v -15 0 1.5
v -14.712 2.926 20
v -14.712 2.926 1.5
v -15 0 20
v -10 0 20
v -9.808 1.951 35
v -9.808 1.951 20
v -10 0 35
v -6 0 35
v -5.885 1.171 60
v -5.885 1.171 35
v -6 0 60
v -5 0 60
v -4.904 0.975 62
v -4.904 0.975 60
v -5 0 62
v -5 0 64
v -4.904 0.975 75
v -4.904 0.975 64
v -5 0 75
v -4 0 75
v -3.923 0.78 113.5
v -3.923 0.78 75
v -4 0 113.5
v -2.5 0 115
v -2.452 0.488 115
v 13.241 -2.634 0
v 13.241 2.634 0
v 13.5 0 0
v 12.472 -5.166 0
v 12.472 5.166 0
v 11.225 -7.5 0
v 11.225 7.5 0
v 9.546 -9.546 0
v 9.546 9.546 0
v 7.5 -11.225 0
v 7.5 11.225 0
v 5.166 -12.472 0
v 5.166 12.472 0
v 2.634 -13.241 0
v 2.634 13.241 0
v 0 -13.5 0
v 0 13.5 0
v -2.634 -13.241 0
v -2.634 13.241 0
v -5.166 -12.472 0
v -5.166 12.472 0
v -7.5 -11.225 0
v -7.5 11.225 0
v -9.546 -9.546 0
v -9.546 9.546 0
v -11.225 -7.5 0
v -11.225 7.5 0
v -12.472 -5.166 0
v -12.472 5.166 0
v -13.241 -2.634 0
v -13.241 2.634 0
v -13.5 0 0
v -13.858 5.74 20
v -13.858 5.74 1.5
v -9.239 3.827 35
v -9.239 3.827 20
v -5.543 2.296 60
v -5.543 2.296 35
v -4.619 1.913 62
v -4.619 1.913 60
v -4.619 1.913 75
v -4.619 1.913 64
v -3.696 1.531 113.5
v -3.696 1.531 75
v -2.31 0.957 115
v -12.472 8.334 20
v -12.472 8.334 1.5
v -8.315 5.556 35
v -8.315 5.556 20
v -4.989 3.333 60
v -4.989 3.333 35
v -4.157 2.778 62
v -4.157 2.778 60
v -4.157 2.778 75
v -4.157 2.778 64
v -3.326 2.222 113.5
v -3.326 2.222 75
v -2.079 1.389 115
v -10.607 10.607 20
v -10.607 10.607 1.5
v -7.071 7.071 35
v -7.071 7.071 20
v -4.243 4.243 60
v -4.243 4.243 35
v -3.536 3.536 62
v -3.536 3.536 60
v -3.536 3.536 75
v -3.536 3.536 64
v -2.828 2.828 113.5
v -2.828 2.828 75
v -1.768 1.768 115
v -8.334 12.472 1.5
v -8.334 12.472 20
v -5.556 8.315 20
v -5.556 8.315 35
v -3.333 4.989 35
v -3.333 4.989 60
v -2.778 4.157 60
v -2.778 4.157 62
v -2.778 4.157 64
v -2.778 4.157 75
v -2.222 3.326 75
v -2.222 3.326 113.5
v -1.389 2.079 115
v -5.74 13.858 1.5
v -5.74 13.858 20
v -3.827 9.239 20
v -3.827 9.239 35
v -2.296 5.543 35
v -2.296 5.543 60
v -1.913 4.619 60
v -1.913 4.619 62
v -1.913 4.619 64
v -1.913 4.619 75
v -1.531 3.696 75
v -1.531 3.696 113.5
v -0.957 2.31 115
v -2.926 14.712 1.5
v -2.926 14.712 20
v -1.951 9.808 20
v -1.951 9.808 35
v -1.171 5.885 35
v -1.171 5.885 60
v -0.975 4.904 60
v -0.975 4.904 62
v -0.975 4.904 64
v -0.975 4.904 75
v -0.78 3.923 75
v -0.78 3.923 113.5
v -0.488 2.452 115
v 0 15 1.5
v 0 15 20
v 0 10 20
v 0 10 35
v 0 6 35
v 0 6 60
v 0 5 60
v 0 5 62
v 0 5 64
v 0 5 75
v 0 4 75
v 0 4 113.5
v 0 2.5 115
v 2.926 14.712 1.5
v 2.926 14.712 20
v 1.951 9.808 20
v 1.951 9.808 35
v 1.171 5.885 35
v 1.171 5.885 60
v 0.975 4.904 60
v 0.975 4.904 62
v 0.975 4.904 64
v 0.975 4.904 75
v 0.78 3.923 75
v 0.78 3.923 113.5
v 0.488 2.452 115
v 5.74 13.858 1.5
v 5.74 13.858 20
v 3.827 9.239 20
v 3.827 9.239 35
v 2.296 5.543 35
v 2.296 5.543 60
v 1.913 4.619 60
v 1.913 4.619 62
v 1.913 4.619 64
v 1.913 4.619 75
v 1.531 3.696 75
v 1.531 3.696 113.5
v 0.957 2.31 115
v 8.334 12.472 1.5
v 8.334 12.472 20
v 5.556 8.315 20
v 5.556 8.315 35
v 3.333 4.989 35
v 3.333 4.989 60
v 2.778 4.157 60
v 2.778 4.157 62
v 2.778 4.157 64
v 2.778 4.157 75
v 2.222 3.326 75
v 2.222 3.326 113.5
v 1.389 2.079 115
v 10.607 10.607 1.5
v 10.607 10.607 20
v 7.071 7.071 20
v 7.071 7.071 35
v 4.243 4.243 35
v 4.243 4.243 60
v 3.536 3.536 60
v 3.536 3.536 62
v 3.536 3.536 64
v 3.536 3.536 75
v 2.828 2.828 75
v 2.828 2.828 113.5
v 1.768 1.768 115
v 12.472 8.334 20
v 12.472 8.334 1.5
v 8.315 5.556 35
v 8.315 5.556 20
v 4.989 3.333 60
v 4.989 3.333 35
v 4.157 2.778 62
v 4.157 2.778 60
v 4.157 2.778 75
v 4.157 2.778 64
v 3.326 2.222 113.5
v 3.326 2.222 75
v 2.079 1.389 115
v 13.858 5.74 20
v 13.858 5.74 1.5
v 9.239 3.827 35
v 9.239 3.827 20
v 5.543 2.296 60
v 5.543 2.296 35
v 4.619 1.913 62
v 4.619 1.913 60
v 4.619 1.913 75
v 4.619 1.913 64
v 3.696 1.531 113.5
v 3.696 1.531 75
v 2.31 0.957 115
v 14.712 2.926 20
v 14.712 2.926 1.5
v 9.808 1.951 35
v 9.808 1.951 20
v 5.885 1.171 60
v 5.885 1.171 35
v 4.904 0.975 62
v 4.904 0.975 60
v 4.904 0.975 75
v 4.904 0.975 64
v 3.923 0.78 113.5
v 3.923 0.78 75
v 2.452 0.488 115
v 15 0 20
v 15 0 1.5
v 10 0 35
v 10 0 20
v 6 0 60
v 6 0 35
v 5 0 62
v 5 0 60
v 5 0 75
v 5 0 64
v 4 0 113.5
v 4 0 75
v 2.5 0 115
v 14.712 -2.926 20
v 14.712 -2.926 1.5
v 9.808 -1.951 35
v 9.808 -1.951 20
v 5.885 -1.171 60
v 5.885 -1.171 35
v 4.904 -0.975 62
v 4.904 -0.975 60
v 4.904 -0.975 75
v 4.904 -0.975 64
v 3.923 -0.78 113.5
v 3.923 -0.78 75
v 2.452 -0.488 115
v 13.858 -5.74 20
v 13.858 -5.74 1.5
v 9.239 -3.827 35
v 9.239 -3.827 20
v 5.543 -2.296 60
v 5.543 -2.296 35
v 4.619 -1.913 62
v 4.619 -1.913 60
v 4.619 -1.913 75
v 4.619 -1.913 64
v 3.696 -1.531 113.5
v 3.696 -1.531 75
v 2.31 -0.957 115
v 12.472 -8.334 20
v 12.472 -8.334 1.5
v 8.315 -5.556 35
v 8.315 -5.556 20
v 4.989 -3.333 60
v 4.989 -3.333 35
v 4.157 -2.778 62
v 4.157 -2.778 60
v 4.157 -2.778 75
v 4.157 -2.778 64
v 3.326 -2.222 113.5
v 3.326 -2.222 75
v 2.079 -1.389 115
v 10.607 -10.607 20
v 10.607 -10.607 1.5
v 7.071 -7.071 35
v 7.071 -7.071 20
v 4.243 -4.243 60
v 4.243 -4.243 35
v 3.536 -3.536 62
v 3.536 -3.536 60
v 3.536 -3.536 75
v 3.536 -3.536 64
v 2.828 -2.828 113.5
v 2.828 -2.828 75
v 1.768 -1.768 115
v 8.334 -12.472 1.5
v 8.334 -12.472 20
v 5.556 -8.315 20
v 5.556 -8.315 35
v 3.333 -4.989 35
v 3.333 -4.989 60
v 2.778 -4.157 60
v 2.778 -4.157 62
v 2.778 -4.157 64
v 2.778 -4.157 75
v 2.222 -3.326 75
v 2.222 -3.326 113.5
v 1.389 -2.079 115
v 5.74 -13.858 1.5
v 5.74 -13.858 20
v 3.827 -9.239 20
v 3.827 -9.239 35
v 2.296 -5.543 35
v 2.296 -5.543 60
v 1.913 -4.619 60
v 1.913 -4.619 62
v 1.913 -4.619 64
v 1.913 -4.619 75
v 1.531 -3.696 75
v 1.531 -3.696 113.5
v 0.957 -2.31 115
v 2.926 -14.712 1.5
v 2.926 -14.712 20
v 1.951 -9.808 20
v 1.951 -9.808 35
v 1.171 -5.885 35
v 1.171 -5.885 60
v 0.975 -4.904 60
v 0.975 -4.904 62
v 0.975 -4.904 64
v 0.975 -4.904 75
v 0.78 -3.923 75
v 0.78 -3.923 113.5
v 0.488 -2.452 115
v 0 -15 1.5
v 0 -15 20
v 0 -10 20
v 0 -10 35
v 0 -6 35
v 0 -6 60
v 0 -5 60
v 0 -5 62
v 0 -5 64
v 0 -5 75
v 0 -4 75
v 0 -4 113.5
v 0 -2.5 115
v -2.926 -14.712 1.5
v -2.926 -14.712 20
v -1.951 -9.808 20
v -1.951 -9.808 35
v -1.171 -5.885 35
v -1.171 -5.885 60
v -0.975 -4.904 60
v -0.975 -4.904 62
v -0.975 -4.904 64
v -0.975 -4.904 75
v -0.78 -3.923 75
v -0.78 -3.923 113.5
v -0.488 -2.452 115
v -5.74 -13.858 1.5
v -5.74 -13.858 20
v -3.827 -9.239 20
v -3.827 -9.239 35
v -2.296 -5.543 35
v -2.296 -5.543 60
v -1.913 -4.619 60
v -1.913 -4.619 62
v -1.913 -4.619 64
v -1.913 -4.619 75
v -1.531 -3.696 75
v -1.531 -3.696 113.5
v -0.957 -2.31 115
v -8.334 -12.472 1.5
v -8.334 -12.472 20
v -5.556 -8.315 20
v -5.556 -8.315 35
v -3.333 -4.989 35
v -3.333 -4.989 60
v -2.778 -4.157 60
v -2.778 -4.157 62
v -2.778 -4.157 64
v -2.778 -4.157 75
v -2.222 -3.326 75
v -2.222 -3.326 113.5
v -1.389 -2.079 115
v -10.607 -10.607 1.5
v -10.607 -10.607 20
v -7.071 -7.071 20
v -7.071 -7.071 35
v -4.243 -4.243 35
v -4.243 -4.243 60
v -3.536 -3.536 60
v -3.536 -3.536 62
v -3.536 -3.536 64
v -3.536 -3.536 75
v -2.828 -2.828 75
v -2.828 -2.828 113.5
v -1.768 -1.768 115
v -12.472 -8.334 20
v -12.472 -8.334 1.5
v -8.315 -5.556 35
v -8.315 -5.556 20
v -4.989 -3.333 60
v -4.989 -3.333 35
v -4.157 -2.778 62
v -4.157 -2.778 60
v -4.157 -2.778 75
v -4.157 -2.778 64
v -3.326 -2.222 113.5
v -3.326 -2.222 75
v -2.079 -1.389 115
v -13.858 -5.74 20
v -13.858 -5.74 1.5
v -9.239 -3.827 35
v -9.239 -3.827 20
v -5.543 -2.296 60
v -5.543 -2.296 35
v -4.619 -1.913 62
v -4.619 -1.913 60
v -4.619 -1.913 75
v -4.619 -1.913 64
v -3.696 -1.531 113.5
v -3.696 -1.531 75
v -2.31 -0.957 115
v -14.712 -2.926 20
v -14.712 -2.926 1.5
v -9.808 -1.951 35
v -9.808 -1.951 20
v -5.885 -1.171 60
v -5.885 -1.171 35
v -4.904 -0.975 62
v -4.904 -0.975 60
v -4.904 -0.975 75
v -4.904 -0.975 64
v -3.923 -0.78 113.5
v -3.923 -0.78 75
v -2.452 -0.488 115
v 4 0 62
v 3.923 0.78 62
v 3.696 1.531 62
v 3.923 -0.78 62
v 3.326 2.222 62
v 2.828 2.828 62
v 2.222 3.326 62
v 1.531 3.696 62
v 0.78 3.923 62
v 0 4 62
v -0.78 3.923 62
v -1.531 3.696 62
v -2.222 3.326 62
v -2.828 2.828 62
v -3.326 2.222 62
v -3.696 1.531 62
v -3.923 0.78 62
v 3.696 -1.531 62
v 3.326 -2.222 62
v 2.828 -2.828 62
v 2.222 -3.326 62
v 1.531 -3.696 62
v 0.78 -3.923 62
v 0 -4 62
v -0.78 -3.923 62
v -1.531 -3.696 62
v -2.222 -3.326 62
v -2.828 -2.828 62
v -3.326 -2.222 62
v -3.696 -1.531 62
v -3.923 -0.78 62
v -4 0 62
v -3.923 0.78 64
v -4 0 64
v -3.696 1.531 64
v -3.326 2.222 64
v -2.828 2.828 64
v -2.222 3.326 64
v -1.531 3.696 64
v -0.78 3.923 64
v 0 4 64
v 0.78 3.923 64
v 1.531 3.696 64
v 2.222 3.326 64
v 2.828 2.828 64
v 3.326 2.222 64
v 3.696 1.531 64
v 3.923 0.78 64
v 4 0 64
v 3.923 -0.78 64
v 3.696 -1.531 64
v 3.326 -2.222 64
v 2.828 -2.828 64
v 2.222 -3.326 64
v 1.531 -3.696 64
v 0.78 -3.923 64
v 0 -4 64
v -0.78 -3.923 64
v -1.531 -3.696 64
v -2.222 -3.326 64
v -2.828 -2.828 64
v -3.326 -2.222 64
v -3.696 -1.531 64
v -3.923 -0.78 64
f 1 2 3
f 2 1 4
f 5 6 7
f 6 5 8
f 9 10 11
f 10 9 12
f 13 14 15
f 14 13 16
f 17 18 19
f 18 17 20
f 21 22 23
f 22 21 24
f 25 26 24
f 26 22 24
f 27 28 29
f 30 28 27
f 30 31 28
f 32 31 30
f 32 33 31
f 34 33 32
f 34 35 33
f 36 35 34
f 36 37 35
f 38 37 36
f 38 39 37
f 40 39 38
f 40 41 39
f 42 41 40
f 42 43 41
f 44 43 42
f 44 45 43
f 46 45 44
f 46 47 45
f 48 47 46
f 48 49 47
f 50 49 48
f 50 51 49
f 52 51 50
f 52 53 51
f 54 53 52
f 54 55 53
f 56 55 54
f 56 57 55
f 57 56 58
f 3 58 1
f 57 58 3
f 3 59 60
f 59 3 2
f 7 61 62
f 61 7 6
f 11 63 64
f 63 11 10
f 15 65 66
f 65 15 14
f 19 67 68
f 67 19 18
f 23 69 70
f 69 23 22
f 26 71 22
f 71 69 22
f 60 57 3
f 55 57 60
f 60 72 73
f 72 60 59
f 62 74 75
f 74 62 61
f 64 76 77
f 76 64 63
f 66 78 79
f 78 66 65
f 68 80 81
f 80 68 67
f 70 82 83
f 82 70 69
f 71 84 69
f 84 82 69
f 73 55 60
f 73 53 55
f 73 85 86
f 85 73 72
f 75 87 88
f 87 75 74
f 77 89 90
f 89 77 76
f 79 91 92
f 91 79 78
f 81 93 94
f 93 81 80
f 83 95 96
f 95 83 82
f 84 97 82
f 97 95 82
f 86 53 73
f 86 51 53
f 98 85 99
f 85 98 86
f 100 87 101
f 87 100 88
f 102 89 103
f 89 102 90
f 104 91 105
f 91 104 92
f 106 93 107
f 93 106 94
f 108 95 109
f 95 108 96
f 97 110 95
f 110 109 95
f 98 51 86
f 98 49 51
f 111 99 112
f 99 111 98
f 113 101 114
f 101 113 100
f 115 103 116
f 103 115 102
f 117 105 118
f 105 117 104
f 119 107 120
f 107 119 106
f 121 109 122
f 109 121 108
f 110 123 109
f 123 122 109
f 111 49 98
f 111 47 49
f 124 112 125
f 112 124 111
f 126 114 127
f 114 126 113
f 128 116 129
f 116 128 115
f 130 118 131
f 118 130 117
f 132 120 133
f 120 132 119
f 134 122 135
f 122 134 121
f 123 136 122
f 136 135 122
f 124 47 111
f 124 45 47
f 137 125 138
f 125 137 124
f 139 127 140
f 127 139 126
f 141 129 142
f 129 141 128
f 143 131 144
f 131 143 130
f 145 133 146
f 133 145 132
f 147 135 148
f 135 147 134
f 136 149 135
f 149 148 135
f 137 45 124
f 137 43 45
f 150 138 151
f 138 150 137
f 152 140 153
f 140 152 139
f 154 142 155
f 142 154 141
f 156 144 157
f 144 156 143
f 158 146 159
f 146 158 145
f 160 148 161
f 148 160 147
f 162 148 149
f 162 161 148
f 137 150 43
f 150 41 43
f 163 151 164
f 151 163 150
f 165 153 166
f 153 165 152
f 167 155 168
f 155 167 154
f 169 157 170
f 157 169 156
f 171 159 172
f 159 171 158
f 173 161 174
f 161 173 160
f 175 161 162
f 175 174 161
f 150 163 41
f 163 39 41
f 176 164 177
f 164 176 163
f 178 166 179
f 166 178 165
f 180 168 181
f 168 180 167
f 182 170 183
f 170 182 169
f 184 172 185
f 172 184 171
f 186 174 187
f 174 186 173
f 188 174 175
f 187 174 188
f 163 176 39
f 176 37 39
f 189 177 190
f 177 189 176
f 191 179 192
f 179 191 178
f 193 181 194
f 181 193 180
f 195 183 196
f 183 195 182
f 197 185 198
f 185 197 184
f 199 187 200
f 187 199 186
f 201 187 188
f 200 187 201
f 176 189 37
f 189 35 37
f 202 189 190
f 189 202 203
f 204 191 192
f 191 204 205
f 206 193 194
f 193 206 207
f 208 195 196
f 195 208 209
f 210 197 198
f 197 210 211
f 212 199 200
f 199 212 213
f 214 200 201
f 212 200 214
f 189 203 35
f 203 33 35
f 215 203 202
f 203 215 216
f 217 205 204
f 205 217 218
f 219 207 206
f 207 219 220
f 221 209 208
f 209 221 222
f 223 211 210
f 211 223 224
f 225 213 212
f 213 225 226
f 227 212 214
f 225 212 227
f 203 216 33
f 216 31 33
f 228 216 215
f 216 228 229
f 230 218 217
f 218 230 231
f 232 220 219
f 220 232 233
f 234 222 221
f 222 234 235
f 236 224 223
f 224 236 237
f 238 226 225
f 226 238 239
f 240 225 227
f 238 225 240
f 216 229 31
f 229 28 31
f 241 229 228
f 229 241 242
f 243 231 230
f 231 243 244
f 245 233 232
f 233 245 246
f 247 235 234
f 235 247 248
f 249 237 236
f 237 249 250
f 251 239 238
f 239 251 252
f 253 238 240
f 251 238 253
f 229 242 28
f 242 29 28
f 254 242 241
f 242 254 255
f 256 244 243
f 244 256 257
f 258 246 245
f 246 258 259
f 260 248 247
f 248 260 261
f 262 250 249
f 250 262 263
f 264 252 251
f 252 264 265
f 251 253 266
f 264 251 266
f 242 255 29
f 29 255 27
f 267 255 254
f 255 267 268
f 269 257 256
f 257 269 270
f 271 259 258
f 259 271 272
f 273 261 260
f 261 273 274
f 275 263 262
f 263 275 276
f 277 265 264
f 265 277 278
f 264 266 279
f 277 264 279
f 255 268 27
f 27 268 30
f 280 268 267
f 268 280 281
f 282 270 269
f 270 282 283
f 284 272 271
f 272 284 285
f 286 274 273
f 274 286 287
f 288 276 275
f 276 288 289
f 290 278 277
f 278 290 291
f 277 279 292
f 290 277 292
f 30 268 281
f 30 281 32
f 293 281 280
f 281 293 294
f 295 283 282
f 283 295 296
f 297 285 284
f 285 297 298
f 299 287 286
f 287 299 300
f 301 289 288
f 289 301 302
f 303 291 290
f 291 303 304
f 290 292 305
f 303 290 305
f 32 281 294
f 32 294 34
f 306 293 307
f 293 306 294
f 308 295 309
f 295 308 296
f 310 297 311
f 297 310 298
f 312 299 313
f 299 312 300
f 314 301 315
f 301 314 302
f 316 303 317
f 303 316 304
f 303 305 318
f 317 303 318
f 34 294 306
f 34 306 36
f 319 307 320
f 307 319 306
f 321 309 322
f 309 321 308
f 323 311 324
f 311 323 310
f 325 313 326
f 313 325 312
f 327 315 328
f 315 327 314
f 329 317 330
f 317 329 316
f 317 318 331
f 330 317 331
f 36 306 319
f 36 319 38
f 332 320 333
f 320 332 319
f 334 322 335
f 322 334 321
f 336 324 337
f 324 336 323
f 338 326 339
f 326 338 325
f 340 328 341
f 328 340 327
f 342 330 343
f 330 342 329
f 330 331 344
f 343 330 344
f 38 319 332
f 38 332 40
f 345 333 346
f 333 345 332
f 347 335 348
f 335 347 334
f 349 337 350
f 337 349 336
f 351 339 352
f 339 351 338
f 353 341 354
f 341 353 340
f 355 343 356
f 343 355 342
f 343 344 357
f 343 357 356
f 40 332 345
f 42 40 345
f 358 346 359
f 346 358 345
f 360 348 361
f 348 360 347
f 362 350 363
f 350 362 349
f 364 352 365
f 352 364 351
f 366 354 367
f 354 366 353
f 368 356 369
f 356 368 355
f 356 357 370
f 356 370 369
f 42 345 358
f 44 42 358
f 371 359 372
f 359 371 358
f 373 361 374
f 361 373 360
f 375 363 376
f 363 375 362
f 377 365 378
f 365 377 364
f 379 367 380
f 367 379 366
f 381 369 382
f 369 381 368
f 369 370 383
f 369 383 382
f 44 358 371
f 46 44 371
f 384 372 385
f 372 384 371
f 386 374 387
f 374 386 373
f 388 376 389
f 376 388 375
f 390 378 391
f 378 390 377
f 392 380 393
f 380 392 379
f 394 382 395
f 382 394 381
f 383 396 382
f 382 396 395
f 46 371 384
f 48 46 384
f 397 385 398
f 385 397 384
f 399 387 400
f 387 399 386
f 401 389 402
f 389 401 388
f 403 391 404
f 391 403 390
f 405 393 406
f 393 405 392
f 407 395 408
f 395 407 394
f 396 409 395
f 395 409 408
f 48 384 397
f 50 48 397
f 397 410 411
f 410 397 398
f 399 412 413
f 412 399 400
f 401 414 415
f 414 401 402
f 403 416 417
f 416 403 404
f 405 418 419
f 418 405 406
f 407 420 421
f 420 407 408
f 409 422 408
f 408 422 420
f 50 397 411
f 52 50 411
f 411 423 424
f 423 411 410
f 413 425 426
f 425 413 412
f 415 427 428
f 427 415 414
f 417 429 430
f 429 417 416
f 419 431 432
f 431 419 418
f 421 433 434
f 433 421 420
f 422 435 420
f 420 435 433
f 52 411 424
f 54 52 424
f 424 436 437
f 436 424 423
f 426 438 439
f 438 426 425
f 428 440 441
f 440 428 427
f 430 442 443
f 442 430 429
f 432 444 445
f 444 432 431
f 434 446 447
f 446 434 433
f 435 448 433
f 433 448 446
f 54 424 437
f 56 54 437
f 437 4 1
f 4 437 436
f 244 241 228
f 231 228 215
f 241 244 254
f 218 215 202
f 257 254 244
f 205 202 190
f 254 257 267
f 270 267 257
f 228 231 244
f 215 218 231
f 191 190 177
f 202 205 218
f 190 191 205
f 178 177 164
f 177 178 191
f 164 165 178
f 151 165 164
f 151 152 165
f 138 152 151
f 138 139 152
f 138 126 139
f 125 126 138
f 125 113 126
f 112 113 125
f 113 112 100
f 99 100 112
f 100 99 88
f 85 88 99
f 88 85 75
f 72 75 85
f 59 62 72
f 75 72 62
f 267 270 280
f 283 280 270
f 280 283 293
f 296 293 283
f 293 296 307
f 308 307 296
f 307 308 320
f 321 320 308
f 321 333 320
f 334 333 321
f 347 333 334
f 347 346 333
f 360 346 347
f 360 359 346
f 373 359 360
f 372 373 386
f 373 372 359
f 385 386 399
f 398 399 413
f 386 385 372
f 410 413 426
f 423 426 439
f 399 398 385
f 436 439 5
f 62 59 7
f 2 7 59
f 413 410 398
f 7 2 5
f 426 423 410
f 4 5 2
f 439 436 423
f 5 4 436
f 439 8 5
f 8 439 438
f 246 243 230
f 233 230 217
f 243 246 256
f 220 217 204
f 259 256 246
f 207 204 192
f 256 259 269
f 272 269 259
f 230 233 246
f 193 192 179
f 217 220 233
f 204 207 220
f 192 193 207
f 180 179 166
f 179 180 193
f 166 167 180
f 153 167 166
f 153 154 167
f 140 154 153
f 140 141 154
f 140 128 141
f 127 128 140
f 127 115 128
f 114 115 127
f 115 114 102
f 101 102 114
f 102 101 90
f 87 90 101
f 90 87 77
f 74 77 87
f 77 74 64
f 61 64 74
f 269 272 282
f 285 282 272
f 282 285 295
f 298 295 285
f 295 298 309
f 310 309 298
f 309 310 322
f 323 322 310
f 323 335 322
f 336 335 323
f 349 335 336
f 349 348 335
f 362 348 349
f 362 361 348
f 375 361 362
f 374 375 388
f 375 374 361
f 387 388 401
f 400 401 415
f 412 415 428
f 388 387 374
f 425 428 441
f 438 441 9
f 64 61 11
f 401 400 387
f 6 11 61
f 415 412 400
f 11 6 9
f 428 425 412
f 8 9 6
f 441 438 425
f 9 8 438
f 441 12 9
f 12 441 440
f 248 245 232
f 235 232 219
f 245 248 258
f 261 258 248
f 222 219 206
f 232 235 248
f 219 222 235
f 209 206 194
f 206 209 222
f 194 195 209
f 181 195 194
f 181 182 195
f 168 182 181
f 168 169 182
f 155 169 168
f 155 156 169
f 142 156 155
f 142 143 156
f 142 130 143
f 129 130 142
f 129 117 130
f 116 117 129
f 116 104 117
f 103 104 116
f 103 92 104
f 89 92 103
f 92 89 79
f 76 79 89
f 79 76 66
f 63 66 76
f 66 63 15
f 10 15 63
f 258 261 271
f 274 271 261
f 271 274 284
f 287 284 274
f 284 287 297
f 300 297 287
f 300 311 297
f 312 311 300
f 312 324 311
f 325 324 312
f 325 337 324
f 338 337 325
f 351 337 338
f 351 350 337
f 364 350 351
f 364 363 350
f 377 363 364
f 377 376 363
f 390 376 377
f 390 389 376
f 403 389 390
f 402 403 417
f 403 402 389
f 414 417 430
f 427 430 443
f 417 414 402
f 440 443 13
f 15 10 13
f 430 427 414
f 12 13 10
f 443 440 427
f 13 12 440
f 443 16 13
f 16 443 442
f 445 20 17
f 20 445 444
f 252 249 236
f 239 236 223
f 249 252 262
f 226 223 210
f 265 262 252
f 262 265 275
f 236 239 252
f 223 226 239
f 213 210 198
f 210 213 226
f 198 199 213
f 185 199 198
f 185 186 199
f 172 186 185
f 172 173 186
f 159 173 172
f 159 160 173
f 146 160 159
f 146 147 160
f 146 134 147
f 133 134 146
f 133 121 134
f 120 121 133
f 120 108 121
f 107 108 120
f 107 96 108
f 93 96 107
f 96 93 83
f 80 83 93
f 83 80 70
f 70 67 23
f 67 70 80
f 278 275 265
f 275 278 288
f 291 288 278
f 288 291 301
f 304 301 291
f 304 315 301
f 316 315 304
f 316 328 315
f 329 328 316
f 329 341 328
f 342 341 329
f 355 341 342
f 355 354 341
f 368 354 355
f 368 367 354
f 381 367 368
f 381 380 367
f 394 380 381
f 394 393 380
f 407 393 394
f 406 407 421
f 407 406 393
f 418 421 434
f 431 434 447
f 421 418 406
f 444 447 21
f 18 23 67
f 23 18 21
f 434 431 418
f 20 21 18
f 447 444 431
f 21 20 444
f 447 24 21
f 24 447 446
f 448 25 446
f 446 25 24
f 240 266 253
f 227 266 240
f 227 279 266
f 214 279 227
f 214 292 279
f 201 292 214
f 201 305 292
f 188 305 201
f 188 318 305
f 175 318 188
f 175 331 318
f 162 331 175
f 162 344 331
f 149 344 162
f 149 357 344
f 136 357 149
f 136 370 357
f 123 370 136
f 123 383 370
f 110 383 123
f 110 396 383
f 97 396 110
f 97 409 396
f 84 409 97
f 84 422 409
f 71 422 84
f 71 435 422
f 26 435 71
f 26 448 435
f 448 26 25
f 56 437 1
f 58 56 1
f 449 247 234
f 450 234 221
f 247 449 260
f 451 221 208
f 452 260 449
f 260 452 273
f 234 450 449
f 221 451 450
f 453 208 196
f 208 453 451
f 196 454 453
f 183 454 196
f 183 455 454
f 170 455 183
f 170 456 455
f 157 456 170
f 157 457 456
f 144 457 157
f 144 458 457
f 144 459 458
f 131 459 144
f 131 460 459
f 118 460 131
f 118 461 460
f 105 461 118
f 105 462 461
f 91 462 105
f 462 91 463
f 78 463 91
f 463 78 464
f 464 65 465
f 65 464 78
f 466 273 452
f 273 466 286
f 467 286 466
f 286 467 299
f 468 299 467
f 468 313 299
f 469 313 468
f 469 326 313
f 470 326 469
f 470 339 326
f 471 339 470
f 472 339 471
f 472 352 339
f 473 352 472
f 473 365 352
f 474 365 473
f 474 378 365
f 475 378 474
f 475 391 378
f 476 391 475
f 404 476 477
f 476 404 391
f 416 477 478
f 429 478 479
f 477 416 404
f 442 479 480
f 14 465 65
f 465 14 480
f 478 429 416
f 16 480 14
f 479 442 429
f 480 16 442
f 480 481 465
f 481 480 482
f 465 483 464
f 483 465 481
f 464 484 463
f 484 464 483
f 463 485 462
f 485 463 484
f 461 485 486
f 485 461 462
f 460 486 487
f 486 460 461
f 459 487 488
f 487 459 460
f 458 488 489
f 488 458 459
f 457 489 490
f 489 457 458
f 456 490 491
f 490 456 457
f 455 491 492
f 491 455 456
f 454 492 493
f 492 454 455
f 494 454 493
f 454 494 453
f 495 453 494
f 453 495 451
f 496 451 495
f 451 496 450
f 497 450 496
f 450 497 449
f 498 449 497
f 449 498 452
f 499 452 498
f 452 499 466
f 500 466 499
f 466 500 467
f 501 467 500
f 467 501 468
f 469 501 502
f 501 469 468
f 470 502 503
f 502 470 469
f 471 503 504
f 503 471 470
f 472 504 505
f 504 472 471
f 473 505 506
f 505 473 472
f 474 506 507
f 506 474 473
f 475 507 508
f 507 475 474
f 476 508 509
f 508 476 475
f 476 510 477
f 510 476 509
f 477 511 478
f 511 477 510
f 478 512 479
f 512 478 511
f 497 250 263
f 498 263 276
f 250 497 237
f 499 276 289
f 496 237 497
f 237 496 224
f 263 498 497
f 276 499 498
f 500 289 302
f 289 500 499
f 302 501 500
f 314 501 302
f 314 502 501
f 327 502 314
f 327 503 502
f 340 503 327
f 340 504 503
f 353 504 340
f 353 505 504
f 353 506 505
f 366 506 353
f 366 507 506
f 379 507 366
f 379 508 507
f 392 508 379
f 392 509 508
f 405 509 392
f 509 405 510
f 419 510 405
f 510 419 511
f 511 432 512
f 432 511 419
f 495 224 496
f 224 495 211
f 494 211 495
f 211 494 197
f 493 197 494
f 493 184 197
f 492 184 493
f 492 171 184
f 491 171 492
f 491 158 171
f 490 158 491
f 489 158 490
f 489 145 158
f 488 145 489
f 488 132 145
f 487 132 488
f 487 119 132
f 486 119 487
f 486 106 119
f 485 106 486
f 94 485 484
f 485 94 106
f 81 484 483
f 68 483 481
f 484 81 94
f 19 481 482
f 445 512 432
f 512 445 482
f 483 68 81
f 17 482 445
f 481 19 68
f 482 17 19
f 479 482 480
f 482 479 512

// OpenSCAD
$fn = 32;

// ----------------------------------------------------------------------
// Stepped shaft: diameters 30, 20, 12, 10, 8 mm, 115 mm long
// ----------------------------------------------------------------------

// --- parameters (mm) ---
d1 = 30;                  // step 1 diameter
len1 = 20;                // step 1 length
d2 = 20;                  // step 2 diameter
len2 = 15;                // step 2 length
d3 = 12;                  // step 3 diameter
len3 = 25;                // step 3 length
d4 = 10;                  // step 4 diameter
len4 = 15;                // step 4 length
d5 = 8;                   // step 5 diameter
len5 = 40;                // step 5 length
total = 115;              // overall length
chamfer = 1.5;            // end chamfer
groove_r = 5;             // groove radius
groove_z = 62;            // groove position from the end
groove_w = 2;             // groove width
groove_d = 1;             // groove depth
key_w = 5;                // keyway width
key_d = 2.5;              // keyway depth
key_len = 14;             // keyway length
key_z = 98;               // keyway start along the shaft

/* closed turning profile: x is the radius, y is the length */
profile = [[0, 0], [15 - chamfer, 0], [15, chamfer], [15, 20], [10, 20], [10, 35], [6, 35], [6, 60], [5, 60], [5, 75], [4, 75], [4, 113.5], [2.5, 115], [0, 115]];

difference() {
  rotate_extrude() polygon(profile);
  /* circlip groove just behind the shoulder */
  rotate_extrude() translate([groove_r - groove_d, groove_z]) square([groove_d + 1, groove_w]);
  /* keyway milled into the top of the largest step */
  translate([d1 / 2 - key_d, -key_w / 2, key_z]) cube([key_d + 1, key_w, key_len]);
}
